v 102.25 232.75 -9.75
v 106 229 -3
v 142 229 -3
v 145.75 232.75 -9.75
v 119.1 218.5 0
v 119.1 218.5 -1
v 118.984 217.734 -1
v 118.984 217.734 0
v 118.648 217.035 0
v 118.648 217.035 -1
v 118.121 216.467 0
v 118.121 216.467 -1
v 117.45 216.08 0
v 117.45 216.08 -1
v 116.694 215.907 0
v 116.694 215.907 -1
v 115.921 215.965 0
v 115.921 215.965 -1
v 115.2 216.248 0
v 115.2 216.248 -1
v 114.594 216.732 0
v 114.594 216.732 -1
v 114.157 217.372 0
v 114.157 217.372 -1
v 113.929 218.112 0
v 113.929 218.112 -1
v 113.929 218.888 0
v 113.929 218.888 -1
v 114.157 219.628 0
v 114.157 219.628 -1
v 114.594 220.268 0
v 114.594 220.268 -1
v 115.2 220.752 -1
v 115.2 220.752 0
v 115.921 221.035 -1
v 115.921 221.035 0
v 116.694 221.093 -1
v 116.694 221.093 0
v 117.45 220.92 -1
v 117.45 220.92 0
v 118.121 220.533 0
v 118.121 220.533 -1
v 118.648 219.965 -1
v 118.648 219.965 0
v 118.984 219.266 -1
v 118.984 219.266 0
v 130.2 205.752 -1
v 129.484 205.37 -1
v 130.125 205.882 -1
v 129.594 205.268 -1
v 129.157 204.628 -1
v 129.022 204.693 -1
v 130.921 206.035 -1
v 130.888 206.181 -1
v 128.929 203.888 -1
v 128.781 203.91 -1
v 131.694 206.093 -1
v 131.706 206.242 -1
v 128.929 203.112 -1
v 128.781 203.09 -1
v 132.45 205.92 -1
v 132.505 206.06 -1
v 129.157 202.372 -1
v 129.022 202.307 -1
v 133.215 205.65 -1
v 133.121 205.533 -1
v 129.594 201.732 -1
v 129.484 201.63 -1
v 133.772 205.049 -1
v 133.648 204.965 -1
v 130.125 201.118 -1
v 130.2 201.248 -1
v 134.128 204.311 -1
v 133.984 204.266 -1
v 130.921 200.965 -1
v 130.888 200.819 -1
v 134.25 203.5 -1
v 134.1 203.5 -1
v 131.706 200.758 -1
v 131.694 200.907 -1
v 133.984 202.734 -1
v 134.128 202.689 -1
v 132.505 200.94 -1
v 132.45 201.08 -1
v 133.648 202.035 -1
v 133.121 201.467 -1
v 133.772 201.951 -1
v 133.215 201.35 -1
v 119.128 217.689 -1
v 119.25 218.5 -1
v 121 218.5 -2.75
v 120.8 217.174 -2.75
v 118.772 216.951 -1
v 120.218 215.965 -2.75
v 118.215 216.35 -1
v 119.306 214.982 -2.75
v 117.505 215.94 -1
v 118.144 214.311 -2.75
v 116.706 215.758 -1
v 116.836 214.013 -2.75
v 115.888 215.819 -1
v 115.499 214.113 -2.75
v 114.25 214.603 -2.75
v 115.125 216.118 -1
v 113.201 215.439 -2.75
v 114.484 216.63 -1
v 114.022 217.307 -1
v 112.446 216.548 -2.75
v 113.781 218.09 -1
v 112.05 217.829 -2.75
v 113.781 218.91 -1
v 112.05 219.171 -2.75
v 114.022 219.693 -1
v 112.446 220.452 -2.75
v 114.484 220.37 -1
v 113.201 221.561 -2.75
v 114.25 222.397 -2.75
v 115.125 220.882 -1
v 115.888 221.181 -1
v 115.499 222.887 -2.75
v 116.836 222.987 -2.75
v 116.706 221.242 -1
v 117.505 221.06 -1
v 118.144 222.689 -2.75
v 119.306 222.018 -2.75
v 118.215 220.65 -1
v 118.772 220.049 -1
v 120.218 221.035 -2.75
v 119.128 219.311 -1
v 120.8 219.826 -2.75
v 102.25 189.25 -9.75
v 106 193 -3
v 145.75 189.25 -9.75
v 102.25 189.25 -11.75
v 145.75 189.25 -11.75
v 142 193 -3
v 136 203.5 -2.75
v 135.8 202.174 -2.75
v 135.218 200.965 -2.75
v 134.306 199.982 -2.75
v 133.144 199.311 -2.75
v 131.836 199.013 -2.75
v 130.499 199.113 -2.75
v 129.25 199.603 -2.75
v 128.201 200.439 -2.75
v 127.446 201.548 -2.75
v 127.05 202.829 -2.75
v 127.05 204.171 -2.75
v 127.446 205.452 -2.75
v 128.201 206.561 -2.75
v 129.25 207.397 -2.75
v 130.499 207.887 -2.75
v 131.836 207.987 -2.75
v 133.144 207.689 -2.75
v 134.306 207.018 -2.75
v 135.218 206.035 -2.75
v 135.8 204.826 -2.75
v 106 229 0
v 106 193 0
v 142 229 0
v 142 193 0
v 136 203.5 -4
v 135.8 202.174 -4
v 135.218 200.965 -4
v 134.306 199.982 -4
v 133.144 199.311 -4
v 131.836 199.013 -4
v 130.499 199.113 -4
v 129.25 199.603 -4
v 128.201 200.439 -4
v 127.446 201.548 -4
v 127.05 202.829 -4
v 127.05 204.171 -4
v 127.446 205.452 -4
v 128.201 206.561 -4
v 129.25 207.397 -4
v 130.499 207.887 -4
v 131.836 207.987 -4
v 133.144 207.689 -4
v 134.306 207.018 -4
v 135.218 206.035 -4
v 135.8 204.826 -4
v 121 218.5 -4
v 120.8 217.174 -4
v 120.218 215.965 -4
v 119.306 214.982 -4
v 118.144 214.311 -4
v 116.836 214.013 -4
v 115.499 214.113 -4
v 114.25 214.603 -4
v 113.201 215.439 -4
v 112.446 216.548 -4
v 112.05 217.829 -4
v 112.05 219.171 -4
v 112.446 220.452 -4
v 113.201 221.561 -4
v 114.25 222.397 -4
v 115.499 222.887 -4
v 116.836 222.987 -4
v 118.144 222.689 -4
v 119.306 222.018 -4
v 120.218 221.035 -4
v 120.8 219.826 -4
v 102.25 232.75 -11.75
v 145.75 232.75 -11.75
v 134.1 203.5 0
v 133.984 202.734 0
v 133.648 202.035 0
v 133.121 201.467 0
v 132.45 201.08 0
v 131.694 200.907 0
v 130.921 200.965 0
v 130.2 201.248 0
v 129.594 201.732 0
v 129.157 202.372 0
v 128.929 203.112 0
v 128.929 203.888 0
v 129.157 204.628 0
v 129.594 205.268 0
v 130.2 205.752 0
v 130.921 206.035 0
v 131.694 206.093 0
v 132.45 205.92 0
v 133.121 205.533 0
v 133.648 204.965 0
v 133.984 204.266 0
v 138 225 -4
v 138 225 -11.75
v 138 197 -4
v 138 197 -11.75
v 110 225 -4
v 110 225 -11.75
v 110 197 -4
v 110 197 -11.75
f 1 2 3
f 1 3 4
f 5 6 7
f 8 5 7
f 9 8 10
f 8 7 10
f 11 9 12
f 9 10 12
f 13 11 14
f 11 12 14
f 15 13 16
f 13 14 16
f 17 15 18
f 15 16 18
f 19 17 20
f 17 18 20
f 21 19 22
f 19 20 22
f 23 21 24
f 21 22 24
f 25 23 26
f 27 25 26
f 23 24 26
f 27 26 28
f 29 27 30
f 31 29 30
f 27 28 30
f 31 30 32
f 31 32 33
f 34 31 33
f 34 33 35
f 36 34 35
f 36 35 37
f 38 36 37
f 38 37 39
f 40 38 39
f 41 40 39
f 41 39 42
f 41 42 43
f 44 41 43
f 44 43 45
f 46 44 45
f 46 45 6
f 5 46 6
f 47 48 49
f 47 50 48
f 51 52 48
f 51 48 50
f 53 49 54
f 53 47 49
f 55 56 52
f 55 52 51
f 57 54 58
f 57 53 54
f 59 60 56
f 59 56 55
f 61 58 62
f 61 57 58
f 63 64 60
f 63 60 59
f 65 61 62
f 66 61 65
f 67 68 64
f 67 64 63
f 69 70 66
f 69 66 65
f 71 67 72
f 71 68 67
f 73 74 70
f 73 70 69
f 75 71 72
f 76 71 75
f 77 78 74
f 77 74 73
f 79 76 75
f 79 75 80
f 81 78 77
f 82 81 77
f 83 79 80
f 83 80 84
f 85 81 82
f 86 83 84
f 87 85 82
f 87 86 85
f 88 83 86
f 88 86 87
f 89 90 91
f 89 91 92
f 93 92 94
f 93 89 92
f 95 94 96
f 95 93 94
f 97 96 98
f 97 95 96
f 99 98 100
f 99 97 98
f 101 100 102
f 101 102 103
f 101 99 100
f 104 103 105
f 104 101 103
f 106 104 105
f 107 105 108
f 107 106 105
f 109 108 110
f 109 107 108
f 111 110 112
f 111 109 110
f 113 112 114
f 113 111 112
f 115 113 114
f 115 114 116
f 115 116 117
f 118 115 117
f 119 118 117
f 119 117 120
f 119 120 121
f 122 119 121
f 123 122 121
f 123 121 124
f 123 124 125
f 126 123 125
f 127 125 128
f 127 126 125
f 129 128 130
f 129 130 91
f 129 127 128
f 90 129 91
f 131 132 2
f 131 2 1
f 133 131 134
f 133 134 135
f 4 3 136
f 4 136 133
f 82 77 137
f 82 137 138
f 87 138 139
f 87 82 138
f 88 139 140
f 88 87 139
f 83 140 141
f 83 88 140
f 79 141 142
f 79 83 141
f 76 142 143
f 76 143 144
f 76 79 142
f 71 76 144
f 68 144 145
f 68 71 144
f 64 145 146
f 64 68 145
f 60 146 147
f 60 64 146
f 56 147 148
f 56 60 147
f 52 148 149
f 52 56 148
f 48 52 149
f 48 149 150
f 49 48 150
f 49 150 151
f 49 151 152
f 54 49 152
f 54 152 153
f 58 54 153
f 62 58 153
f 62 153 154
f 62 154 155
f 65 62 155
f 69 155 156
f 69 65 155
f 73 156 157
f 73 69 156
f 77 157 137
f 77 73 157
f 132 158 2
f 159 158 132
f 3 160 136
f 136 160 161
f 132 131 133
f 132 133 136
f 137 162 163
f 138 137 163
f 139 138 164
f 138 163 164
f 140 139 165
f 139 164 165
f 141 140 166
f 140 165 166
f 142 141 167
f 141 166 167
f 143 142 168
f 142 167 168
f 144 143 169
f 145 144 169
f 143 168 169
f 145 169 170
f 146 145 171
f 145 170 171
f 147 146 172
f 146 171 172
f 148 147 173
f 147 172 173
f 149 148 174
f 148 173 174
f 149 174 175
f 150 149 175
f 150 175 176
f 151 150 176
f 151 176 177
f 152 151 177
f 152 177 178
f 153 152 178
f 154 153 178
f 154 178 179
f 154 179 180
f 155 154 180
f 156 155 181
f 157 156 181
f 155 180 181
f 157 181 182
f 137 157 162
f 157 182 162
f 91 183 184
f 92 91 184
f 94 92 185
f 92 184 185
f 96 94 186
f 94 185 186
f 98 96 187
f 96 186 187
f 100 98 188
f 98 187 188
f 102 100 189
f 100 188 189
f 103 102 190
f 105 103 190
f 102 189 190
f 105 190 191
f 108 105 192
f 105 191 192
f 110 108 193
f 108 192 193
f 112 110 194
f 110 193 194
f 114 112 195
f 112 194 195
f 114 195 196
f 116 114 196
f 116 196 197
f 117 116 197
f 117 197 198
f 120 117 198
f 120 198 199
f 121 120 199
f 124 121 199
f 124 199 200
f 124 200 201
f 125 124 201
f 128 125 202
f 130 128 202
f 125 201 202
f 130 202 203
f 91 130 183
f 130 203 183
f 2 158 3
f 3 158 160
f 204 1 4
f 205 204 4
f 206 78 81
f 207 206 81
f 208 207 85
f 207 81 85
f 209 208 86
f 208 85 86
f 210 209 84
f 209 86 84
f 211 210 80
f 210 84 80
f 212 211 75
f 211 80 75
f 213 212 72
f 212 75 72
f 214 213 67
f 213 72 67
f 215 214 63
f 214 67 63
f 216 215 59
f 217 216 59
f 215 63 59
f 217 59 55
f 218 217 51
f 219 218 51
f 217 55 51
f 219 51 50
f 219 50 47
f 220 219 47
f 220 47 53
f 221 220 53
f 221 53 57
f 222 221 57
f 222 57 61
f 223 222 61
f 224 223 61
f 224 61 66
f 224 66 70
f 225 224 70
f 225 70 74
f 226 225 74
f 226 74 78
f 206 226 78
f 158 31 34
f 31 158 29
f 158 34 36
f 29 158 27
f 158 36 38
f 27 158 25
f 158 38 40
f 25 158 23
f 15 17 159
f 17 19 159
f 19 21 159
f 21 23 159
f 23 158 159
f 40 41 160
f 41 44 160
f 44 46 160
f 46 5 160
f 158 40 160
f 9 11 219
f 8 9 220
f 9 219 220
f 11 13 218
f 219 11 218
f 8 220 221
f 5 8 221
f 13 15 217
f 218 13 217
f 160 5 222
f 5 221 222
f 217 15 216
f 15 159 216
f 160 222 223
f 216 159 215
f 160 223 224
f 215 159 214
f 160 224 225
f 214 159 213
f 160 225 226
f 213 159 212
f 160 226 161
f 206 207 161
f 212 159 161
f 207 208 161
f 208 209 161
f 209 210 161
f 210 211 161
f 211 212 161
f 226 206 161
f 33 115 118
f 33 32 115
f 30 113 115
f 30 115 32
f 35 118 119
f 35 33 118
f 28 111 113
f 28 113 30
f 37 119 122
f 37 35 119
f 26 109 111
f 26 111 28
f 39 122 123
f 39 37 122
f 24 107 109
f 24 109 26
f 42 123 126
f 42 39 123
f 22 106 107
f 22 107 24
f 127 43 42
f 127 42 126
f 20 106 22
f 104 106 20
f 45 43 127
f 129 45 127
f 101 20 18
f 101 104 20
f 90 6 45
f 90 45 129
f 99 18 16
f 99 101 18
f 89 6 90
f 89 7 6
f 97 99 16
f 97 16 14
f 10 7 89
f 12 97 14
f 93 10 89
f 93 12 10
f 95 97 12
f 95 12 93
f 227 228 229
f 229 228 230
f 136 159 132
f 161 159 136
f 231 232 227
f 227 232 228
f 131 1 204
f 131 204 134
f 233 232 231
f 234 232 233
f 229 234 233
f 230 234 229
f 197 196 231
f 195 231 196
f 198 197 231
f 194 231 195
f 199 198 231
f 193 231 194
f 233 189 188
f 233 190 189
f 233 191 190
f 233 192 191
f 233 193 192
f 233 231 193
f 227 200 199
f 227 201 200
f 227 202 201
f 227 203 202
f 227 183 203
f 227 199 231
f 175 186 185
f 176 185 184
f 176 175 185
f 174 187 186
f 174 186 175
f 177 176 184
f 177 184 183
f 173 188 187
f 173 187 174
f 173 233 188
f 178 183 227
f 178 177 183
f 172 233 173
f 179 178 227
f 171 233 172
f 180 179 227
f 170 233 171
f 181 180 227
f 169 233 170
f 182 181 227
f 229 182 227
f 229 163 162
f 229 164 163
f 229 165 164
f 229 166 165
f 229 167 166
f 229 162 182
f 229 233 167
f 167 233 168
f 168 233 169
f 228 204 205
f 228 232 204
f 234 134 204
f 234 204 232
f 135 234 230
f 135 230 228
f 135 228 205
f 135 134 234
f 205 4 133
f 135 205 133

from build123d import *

# Parameters (mm, degrees)
SKETCH021_W     = 36
SKETCH021_H     = 36
PAD006_DEPTH    = 3
SKETCH022_W     = 43.5
SKETCH022_H     = 43.5
PAD007_DEPTH    = 8.75
POCKET014_DEPTH = 100
POCKET015_DEPTH = 100
SKETCH025_W     = 28
SKETCH025_H     = 28
POCKET016_DEPTH = 7.75
SKETCH026_R     = 4.5
POCKET017_DEPTH = 3
SKETCH030_R     = 2.6
POCKET021_DEPTH = 5
CHAMFER003_SIZE = 1.75


with BuildPart() as part:
    # Sketch021 (on Face1 of ShapeBinder003) → Pad006 (new body)
    with BuildSketch(Plane(origin=(0, 0, 0), x_dir=(1, 0, 0), z_dir=(0, 0, -1))):
        with Locations((124, -211)):
            Rectangle(SKETCH021_W, SKETCH021_H)
    extrude(amount=PAD006_DEPTH)

    # Sketch022 (on Face6 of Pad006) → Pad007 (join)
    with BuildSketch(Plane(origin=(0, 0, -3), x_dir=(1, 0, 0), z_dir=(0, 0, -1))):
        with Locations((124, -211)):
            Rectangle(SKETCH022_W, SKETCH022_H)
    extrude(amount=PAD007_DEPTH)

    # Sketch023 (on Face1 of Pad007) → Pocket014 (cut)
    with BuildSketch(Plane.XZ.offset(-189.25)):
        Polygon((106, -3), (102.25, -9.75), (102.25, -3), align=None)
        Polygon((142, -3), (145.75, -9.75), (145.75, -3), align=None)
    extrude(amount=-POCKET014_DEPTH, mode=Mode.SUBTRACT)

    # Sketch024 (on Face7 of Pocket014) → Pocket015 (cut)
    with BuildSketch(Plane(origin=(102.25, 0, 0), x_dir=(0, -1, 0), z_dir=(-1, 0, 0))):
        Polygon((-229, -3), (-232.75, -9.75), (-232.75, -3), align=None)
        Polygon((-193, -3), (-189.25, -3), (-189.25, -9.75), align=None)
    extrude(amount=-POCKET015_DEPTH, mode=Mode.SUBTRACT)

    # Sketch025 (on Face4 of Pocket015) → Pocket016 (cut)
    with BuildSketch(Plane(origin=(0, 0, -11.75), x_dir=(1, 0, 0), z_dir=(0, 0, -1))):
        with Locations((124, -211)):
            Rectangle(SKETCH025_W, SKETCH025_H)
    extrude(amount=-POCKET016_DEPTH, mode=Mode.SUBTRACT)

    # Sketch026 (on Face18 of Pocket016) → Pocket017 (cut)
    with BuildSketch(Plane(origin=(0, 0, -4), x_dir=(1, 0, 0), z_dir=(0, 0, -1))):
        with Locations((116.5, -218.5)):
            Circle(SKETCH026_R)
        with Locations((131.5, -203.5)):
            Circle(SKETCH026_R)
    extrude(amount=-POCKET017_DEPTH, mode=Mode.SUBTRACT)

    # Sketch030 (on Face18 of Pocket017) → Pocket021 (cut)
    with BuildSketch(Plane(origin=(0, 0, -4), x_dir=(1, 0, 0), z_dir=(0, 0, -1))):
        with Locations((116.5, -218.5)):
            Circle(SKETCH030_R)
        with Locations((131.5, -203.5)):
            Circle(SKETCH030_R)
    extrude(amount=-POCKET021_DEPTH, mode=Mode.SUBTRACT)

    # Chamfer003
    chamfer003_edges = [part.edges().sort_by_distance(p)[0] for p in [
        (112, 218.5, -1),
        (127, 203.5, -1),
    ]]
    chamfer(chamfer003_edges, length=CHAMFER003_SIZE)


solid = part.part
